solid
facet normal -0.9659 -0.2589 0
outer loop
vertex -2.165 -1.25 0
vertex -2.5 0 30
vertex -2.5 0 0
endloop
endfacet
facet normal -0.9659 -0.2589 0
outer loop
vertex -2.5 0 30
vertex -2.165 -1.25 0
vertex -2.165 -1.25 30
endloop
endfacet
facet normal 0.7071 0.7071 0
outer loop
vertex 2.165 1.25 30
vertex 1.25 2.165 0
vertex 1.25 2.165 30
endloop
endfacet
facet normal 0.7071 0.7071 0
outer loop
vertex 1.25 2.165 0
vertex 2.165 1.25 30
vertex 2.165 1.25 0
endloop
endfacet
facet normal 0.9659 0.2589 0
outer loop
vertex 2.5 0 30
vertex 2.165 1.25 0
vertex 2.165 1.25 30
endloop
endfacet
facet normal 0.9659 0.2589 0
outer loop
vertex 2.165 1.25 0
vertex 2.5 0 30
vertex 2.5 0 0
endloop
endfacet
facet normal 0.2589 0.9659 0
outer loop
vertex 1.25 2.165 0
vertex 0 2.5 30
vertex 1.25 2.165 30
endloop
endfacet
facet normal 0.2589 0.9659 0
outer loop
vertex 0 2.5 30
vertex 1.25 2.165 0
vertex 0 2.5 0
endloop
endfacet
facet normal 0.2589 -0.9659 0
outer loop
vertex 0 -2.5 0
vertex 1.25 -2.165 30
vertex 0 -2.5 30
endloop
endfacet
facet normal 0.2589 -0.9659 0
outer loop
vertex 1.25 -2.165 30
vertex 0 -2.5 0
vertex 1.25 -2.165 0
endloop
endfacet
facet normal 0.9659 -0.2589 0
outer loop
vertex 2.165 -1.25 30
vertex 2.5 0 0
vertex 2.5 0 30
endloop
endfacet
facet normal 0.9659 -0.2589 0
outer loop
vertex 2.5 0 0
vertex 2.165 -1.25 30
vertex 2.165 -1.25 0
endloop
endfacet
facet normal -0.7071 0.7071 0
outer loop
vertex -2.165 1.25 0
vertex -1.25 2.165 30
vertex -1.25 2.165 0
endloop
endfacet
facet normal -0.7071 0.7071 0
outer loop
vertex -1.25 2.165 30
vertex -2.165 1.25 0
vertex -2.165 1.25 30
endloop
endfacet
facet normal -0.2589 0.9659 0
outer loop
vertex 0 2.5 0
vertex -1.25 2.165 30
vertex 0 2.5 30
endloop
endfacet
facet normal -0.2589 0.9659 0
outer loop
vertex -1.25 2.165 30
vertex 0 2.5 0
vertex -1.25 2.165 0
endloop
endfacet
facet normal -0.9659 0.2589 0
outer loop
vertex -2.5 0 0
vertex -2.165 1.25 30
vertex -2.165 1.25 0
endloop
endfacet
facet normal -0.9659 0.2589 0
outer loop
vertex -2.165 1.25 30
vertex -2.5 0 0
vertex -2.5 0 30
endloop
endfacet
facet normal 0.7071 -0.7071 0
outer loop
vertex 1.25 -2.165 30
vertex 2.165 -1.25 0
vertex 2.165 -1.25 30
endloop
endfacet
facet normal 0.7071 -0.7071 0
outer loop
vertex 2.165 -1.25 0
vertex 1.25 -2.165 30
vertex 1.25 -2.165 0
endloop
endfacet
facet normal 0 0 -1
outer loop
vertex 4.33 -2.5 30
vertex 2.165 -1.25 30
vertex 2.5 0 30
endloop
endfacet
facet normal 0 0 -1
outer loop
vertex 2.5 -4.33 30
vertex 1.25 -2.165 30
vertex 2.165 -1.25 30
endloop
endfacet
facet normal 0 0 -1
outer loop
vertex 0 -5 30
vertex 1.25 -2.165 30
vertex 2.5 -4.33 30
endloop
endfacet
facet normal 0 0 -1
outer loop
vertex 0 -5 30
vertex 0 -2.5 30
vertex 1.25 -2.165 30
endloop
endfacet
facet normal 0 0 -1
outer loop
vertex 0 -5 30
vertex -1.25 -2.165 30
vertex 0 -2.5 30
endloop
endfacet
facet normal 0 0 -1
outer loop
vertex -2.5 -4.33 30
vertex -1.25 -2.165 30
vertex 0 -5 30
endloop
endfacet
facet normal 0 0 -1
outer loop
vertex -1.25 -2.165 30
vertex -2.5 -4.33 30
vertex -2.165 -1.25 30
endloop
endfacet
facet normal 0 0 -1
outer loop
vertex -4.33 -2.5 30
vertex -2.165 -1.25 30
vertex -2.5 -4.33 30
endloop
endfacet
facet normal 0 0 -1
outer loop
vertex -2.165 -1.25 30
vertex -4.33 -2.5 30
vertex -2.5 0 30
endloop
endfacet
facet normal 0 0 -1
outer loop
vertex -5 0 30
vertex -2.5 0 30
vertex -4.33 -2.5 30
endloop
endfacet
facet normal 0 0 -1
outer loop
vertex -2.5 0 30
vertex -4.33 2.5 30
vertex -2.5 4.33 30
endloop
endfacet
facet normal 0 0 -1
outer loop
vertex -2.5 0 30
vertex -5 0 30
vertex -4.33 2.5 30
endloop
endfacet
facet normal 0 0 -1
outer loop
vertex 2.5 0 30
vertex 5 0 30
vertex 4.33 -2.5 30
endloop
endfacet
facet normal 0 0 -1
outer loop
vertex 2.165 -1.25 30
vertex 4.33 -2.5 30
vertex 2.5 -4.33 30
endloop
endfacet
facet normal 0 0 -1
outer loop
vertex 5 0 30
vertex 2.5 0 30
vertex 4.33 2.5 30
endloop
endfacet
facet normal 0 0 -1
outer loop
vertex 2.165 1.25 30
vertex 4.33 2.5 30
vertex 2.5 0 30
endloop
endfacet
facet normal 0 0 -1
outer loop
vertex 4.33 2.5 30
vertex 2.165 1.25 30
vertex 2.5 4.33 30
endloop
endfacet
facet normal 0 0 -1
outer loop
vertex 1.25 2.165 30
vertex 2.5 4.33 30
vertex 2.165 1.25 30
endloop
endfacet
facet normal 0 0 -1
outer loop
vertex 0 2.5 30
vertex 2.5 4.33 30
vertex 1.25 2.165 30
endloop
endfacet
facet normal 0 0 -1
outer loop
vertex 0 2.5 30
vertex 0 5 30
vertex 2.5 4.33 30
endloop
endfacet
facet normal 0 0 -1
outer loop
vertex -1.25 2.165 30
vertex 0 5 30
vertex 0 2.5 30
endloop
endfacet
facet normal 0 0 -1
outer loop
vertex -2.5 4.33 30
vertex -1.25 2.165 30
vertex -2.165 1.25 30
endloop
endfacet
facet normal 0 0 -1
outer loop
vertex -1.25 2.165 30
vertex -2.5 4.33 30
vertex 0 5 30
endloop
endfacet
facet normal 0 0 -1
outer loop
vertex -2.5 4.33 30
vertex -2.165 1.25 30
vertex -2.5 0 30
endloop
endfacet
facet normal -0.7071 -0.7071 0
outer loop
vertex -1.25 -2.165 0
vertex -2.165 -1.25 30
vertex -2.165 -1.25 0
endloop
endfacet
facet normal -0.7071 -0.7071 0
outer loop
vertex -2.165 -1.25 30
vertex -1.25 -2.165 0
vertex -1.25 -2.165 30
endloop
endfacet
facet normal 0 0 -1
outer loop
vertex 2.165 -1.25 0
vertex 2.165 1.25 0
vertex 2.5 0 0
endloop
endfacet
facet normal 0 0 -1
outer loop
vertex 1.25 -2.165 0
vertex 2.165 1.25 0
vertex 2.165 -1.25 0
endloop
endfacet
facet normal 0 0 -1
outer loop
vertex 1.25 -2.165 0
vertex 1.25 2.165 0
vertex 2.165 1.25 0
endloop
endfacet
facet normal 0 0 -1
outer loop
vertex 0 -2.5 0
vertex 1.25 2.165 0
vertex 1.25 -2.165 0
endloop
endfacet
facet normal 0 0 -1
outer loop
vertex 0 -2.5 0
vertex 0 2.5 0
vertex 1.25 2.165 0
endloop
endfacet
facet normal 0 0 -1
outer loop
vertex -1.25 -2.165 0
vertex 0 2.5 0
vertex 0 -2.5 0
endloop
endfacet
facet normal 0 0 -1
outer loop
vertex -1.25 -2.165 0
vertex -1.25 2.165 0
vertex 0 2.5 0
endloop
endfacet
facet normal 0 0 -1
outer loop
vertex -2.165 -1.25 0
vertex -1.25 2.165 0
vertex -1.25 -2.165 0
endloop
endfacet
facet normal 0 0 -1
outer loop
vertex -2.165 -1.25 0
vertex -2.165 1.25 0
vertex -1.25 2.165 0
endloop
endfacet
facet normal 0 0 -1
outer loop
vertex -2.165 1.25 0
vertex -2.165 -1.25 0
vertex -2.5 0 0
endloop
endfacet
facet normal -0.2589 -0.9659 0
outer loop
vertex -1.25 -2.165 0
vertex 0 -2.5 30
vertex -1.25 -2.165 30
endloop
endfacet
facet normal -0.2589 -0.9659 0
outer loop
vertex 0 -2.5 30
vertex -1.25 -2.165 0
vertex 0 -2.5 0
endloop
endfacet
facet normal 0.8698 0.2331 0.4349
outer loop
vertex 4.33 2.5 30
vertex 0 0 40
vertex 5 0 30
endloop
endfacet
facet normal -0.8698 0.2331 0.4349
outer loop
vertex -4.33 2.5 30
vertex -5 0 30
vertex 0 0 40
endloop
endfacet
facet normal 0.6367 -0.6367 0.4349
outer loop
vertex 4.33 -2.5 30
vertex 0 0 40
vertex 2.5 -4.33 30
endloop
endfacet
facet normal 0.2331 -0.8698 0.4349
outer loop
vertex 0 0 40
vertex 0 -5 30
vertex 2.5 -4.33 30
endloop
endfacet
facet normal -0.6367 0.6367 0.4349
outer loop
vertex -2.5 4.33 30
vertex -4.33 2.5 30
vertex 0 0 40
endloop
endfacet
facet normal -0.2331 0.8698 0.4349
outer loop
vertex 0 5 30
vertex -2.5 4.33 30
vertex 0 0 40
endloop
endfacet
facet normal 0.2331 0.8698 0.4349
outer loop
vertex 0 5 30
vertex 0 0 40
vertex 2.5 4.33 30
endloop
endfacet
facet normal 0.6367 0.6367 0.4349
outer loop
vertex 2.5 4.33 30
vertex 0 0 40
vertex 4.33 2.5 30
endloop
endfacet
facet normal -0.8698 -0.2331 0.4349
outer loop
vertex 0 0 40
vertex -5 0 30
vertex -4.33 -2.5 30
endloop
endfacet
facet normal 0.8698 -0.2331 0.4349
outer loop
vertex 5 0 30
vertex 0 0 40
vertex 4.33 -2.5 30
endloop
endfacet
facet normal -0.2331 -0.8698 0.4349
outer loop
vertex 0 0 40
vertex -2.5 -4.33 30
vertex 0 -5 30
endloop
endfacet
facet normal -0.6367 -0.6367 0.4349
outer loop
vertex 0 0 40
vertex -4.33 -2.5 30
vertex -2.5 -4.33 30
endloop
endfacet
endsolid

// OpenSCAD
TRANSFORM = "none"; // [none, translate, rotate, scale]

module arrow() {
    $fn = 12;

    cylinder(h = 30, r = 2.5);

    translate([0, 0, 30])
    cylinder(h = 10, r1 = 5, r2 = 0);
}

module bottom_text(s) {
    color("grey") {
        linear_extrude(1);
        translate([-30, -25])
        text(s, size = 5, font = "monospace");

        translate([0, -10, 0])
        children();
    }
}

if (TRANSFORM == "none") {
    arrow();
    bottom_text("arrow();");
} else if (TRANSFORM == "translate") {
    translate([10, 5, 5])
    arrow();

    bottom_text("translate([10, 5, 5])")
    bottom_text("arrow();");
} else if (TRANSFORM == "rotate") {
    rotate([-20, 20, 0])
    arrow();

    bottom_text("rotate([-20, 20, 0])")
    bottom_text("arrow();");
} else if (TRANSFORM == "scale") {
    scale([2, 0.5, 1])
    arrow();

    bottom_text("scale([2, 0.5, 1])")
    bottom_text("arrow();");
}
